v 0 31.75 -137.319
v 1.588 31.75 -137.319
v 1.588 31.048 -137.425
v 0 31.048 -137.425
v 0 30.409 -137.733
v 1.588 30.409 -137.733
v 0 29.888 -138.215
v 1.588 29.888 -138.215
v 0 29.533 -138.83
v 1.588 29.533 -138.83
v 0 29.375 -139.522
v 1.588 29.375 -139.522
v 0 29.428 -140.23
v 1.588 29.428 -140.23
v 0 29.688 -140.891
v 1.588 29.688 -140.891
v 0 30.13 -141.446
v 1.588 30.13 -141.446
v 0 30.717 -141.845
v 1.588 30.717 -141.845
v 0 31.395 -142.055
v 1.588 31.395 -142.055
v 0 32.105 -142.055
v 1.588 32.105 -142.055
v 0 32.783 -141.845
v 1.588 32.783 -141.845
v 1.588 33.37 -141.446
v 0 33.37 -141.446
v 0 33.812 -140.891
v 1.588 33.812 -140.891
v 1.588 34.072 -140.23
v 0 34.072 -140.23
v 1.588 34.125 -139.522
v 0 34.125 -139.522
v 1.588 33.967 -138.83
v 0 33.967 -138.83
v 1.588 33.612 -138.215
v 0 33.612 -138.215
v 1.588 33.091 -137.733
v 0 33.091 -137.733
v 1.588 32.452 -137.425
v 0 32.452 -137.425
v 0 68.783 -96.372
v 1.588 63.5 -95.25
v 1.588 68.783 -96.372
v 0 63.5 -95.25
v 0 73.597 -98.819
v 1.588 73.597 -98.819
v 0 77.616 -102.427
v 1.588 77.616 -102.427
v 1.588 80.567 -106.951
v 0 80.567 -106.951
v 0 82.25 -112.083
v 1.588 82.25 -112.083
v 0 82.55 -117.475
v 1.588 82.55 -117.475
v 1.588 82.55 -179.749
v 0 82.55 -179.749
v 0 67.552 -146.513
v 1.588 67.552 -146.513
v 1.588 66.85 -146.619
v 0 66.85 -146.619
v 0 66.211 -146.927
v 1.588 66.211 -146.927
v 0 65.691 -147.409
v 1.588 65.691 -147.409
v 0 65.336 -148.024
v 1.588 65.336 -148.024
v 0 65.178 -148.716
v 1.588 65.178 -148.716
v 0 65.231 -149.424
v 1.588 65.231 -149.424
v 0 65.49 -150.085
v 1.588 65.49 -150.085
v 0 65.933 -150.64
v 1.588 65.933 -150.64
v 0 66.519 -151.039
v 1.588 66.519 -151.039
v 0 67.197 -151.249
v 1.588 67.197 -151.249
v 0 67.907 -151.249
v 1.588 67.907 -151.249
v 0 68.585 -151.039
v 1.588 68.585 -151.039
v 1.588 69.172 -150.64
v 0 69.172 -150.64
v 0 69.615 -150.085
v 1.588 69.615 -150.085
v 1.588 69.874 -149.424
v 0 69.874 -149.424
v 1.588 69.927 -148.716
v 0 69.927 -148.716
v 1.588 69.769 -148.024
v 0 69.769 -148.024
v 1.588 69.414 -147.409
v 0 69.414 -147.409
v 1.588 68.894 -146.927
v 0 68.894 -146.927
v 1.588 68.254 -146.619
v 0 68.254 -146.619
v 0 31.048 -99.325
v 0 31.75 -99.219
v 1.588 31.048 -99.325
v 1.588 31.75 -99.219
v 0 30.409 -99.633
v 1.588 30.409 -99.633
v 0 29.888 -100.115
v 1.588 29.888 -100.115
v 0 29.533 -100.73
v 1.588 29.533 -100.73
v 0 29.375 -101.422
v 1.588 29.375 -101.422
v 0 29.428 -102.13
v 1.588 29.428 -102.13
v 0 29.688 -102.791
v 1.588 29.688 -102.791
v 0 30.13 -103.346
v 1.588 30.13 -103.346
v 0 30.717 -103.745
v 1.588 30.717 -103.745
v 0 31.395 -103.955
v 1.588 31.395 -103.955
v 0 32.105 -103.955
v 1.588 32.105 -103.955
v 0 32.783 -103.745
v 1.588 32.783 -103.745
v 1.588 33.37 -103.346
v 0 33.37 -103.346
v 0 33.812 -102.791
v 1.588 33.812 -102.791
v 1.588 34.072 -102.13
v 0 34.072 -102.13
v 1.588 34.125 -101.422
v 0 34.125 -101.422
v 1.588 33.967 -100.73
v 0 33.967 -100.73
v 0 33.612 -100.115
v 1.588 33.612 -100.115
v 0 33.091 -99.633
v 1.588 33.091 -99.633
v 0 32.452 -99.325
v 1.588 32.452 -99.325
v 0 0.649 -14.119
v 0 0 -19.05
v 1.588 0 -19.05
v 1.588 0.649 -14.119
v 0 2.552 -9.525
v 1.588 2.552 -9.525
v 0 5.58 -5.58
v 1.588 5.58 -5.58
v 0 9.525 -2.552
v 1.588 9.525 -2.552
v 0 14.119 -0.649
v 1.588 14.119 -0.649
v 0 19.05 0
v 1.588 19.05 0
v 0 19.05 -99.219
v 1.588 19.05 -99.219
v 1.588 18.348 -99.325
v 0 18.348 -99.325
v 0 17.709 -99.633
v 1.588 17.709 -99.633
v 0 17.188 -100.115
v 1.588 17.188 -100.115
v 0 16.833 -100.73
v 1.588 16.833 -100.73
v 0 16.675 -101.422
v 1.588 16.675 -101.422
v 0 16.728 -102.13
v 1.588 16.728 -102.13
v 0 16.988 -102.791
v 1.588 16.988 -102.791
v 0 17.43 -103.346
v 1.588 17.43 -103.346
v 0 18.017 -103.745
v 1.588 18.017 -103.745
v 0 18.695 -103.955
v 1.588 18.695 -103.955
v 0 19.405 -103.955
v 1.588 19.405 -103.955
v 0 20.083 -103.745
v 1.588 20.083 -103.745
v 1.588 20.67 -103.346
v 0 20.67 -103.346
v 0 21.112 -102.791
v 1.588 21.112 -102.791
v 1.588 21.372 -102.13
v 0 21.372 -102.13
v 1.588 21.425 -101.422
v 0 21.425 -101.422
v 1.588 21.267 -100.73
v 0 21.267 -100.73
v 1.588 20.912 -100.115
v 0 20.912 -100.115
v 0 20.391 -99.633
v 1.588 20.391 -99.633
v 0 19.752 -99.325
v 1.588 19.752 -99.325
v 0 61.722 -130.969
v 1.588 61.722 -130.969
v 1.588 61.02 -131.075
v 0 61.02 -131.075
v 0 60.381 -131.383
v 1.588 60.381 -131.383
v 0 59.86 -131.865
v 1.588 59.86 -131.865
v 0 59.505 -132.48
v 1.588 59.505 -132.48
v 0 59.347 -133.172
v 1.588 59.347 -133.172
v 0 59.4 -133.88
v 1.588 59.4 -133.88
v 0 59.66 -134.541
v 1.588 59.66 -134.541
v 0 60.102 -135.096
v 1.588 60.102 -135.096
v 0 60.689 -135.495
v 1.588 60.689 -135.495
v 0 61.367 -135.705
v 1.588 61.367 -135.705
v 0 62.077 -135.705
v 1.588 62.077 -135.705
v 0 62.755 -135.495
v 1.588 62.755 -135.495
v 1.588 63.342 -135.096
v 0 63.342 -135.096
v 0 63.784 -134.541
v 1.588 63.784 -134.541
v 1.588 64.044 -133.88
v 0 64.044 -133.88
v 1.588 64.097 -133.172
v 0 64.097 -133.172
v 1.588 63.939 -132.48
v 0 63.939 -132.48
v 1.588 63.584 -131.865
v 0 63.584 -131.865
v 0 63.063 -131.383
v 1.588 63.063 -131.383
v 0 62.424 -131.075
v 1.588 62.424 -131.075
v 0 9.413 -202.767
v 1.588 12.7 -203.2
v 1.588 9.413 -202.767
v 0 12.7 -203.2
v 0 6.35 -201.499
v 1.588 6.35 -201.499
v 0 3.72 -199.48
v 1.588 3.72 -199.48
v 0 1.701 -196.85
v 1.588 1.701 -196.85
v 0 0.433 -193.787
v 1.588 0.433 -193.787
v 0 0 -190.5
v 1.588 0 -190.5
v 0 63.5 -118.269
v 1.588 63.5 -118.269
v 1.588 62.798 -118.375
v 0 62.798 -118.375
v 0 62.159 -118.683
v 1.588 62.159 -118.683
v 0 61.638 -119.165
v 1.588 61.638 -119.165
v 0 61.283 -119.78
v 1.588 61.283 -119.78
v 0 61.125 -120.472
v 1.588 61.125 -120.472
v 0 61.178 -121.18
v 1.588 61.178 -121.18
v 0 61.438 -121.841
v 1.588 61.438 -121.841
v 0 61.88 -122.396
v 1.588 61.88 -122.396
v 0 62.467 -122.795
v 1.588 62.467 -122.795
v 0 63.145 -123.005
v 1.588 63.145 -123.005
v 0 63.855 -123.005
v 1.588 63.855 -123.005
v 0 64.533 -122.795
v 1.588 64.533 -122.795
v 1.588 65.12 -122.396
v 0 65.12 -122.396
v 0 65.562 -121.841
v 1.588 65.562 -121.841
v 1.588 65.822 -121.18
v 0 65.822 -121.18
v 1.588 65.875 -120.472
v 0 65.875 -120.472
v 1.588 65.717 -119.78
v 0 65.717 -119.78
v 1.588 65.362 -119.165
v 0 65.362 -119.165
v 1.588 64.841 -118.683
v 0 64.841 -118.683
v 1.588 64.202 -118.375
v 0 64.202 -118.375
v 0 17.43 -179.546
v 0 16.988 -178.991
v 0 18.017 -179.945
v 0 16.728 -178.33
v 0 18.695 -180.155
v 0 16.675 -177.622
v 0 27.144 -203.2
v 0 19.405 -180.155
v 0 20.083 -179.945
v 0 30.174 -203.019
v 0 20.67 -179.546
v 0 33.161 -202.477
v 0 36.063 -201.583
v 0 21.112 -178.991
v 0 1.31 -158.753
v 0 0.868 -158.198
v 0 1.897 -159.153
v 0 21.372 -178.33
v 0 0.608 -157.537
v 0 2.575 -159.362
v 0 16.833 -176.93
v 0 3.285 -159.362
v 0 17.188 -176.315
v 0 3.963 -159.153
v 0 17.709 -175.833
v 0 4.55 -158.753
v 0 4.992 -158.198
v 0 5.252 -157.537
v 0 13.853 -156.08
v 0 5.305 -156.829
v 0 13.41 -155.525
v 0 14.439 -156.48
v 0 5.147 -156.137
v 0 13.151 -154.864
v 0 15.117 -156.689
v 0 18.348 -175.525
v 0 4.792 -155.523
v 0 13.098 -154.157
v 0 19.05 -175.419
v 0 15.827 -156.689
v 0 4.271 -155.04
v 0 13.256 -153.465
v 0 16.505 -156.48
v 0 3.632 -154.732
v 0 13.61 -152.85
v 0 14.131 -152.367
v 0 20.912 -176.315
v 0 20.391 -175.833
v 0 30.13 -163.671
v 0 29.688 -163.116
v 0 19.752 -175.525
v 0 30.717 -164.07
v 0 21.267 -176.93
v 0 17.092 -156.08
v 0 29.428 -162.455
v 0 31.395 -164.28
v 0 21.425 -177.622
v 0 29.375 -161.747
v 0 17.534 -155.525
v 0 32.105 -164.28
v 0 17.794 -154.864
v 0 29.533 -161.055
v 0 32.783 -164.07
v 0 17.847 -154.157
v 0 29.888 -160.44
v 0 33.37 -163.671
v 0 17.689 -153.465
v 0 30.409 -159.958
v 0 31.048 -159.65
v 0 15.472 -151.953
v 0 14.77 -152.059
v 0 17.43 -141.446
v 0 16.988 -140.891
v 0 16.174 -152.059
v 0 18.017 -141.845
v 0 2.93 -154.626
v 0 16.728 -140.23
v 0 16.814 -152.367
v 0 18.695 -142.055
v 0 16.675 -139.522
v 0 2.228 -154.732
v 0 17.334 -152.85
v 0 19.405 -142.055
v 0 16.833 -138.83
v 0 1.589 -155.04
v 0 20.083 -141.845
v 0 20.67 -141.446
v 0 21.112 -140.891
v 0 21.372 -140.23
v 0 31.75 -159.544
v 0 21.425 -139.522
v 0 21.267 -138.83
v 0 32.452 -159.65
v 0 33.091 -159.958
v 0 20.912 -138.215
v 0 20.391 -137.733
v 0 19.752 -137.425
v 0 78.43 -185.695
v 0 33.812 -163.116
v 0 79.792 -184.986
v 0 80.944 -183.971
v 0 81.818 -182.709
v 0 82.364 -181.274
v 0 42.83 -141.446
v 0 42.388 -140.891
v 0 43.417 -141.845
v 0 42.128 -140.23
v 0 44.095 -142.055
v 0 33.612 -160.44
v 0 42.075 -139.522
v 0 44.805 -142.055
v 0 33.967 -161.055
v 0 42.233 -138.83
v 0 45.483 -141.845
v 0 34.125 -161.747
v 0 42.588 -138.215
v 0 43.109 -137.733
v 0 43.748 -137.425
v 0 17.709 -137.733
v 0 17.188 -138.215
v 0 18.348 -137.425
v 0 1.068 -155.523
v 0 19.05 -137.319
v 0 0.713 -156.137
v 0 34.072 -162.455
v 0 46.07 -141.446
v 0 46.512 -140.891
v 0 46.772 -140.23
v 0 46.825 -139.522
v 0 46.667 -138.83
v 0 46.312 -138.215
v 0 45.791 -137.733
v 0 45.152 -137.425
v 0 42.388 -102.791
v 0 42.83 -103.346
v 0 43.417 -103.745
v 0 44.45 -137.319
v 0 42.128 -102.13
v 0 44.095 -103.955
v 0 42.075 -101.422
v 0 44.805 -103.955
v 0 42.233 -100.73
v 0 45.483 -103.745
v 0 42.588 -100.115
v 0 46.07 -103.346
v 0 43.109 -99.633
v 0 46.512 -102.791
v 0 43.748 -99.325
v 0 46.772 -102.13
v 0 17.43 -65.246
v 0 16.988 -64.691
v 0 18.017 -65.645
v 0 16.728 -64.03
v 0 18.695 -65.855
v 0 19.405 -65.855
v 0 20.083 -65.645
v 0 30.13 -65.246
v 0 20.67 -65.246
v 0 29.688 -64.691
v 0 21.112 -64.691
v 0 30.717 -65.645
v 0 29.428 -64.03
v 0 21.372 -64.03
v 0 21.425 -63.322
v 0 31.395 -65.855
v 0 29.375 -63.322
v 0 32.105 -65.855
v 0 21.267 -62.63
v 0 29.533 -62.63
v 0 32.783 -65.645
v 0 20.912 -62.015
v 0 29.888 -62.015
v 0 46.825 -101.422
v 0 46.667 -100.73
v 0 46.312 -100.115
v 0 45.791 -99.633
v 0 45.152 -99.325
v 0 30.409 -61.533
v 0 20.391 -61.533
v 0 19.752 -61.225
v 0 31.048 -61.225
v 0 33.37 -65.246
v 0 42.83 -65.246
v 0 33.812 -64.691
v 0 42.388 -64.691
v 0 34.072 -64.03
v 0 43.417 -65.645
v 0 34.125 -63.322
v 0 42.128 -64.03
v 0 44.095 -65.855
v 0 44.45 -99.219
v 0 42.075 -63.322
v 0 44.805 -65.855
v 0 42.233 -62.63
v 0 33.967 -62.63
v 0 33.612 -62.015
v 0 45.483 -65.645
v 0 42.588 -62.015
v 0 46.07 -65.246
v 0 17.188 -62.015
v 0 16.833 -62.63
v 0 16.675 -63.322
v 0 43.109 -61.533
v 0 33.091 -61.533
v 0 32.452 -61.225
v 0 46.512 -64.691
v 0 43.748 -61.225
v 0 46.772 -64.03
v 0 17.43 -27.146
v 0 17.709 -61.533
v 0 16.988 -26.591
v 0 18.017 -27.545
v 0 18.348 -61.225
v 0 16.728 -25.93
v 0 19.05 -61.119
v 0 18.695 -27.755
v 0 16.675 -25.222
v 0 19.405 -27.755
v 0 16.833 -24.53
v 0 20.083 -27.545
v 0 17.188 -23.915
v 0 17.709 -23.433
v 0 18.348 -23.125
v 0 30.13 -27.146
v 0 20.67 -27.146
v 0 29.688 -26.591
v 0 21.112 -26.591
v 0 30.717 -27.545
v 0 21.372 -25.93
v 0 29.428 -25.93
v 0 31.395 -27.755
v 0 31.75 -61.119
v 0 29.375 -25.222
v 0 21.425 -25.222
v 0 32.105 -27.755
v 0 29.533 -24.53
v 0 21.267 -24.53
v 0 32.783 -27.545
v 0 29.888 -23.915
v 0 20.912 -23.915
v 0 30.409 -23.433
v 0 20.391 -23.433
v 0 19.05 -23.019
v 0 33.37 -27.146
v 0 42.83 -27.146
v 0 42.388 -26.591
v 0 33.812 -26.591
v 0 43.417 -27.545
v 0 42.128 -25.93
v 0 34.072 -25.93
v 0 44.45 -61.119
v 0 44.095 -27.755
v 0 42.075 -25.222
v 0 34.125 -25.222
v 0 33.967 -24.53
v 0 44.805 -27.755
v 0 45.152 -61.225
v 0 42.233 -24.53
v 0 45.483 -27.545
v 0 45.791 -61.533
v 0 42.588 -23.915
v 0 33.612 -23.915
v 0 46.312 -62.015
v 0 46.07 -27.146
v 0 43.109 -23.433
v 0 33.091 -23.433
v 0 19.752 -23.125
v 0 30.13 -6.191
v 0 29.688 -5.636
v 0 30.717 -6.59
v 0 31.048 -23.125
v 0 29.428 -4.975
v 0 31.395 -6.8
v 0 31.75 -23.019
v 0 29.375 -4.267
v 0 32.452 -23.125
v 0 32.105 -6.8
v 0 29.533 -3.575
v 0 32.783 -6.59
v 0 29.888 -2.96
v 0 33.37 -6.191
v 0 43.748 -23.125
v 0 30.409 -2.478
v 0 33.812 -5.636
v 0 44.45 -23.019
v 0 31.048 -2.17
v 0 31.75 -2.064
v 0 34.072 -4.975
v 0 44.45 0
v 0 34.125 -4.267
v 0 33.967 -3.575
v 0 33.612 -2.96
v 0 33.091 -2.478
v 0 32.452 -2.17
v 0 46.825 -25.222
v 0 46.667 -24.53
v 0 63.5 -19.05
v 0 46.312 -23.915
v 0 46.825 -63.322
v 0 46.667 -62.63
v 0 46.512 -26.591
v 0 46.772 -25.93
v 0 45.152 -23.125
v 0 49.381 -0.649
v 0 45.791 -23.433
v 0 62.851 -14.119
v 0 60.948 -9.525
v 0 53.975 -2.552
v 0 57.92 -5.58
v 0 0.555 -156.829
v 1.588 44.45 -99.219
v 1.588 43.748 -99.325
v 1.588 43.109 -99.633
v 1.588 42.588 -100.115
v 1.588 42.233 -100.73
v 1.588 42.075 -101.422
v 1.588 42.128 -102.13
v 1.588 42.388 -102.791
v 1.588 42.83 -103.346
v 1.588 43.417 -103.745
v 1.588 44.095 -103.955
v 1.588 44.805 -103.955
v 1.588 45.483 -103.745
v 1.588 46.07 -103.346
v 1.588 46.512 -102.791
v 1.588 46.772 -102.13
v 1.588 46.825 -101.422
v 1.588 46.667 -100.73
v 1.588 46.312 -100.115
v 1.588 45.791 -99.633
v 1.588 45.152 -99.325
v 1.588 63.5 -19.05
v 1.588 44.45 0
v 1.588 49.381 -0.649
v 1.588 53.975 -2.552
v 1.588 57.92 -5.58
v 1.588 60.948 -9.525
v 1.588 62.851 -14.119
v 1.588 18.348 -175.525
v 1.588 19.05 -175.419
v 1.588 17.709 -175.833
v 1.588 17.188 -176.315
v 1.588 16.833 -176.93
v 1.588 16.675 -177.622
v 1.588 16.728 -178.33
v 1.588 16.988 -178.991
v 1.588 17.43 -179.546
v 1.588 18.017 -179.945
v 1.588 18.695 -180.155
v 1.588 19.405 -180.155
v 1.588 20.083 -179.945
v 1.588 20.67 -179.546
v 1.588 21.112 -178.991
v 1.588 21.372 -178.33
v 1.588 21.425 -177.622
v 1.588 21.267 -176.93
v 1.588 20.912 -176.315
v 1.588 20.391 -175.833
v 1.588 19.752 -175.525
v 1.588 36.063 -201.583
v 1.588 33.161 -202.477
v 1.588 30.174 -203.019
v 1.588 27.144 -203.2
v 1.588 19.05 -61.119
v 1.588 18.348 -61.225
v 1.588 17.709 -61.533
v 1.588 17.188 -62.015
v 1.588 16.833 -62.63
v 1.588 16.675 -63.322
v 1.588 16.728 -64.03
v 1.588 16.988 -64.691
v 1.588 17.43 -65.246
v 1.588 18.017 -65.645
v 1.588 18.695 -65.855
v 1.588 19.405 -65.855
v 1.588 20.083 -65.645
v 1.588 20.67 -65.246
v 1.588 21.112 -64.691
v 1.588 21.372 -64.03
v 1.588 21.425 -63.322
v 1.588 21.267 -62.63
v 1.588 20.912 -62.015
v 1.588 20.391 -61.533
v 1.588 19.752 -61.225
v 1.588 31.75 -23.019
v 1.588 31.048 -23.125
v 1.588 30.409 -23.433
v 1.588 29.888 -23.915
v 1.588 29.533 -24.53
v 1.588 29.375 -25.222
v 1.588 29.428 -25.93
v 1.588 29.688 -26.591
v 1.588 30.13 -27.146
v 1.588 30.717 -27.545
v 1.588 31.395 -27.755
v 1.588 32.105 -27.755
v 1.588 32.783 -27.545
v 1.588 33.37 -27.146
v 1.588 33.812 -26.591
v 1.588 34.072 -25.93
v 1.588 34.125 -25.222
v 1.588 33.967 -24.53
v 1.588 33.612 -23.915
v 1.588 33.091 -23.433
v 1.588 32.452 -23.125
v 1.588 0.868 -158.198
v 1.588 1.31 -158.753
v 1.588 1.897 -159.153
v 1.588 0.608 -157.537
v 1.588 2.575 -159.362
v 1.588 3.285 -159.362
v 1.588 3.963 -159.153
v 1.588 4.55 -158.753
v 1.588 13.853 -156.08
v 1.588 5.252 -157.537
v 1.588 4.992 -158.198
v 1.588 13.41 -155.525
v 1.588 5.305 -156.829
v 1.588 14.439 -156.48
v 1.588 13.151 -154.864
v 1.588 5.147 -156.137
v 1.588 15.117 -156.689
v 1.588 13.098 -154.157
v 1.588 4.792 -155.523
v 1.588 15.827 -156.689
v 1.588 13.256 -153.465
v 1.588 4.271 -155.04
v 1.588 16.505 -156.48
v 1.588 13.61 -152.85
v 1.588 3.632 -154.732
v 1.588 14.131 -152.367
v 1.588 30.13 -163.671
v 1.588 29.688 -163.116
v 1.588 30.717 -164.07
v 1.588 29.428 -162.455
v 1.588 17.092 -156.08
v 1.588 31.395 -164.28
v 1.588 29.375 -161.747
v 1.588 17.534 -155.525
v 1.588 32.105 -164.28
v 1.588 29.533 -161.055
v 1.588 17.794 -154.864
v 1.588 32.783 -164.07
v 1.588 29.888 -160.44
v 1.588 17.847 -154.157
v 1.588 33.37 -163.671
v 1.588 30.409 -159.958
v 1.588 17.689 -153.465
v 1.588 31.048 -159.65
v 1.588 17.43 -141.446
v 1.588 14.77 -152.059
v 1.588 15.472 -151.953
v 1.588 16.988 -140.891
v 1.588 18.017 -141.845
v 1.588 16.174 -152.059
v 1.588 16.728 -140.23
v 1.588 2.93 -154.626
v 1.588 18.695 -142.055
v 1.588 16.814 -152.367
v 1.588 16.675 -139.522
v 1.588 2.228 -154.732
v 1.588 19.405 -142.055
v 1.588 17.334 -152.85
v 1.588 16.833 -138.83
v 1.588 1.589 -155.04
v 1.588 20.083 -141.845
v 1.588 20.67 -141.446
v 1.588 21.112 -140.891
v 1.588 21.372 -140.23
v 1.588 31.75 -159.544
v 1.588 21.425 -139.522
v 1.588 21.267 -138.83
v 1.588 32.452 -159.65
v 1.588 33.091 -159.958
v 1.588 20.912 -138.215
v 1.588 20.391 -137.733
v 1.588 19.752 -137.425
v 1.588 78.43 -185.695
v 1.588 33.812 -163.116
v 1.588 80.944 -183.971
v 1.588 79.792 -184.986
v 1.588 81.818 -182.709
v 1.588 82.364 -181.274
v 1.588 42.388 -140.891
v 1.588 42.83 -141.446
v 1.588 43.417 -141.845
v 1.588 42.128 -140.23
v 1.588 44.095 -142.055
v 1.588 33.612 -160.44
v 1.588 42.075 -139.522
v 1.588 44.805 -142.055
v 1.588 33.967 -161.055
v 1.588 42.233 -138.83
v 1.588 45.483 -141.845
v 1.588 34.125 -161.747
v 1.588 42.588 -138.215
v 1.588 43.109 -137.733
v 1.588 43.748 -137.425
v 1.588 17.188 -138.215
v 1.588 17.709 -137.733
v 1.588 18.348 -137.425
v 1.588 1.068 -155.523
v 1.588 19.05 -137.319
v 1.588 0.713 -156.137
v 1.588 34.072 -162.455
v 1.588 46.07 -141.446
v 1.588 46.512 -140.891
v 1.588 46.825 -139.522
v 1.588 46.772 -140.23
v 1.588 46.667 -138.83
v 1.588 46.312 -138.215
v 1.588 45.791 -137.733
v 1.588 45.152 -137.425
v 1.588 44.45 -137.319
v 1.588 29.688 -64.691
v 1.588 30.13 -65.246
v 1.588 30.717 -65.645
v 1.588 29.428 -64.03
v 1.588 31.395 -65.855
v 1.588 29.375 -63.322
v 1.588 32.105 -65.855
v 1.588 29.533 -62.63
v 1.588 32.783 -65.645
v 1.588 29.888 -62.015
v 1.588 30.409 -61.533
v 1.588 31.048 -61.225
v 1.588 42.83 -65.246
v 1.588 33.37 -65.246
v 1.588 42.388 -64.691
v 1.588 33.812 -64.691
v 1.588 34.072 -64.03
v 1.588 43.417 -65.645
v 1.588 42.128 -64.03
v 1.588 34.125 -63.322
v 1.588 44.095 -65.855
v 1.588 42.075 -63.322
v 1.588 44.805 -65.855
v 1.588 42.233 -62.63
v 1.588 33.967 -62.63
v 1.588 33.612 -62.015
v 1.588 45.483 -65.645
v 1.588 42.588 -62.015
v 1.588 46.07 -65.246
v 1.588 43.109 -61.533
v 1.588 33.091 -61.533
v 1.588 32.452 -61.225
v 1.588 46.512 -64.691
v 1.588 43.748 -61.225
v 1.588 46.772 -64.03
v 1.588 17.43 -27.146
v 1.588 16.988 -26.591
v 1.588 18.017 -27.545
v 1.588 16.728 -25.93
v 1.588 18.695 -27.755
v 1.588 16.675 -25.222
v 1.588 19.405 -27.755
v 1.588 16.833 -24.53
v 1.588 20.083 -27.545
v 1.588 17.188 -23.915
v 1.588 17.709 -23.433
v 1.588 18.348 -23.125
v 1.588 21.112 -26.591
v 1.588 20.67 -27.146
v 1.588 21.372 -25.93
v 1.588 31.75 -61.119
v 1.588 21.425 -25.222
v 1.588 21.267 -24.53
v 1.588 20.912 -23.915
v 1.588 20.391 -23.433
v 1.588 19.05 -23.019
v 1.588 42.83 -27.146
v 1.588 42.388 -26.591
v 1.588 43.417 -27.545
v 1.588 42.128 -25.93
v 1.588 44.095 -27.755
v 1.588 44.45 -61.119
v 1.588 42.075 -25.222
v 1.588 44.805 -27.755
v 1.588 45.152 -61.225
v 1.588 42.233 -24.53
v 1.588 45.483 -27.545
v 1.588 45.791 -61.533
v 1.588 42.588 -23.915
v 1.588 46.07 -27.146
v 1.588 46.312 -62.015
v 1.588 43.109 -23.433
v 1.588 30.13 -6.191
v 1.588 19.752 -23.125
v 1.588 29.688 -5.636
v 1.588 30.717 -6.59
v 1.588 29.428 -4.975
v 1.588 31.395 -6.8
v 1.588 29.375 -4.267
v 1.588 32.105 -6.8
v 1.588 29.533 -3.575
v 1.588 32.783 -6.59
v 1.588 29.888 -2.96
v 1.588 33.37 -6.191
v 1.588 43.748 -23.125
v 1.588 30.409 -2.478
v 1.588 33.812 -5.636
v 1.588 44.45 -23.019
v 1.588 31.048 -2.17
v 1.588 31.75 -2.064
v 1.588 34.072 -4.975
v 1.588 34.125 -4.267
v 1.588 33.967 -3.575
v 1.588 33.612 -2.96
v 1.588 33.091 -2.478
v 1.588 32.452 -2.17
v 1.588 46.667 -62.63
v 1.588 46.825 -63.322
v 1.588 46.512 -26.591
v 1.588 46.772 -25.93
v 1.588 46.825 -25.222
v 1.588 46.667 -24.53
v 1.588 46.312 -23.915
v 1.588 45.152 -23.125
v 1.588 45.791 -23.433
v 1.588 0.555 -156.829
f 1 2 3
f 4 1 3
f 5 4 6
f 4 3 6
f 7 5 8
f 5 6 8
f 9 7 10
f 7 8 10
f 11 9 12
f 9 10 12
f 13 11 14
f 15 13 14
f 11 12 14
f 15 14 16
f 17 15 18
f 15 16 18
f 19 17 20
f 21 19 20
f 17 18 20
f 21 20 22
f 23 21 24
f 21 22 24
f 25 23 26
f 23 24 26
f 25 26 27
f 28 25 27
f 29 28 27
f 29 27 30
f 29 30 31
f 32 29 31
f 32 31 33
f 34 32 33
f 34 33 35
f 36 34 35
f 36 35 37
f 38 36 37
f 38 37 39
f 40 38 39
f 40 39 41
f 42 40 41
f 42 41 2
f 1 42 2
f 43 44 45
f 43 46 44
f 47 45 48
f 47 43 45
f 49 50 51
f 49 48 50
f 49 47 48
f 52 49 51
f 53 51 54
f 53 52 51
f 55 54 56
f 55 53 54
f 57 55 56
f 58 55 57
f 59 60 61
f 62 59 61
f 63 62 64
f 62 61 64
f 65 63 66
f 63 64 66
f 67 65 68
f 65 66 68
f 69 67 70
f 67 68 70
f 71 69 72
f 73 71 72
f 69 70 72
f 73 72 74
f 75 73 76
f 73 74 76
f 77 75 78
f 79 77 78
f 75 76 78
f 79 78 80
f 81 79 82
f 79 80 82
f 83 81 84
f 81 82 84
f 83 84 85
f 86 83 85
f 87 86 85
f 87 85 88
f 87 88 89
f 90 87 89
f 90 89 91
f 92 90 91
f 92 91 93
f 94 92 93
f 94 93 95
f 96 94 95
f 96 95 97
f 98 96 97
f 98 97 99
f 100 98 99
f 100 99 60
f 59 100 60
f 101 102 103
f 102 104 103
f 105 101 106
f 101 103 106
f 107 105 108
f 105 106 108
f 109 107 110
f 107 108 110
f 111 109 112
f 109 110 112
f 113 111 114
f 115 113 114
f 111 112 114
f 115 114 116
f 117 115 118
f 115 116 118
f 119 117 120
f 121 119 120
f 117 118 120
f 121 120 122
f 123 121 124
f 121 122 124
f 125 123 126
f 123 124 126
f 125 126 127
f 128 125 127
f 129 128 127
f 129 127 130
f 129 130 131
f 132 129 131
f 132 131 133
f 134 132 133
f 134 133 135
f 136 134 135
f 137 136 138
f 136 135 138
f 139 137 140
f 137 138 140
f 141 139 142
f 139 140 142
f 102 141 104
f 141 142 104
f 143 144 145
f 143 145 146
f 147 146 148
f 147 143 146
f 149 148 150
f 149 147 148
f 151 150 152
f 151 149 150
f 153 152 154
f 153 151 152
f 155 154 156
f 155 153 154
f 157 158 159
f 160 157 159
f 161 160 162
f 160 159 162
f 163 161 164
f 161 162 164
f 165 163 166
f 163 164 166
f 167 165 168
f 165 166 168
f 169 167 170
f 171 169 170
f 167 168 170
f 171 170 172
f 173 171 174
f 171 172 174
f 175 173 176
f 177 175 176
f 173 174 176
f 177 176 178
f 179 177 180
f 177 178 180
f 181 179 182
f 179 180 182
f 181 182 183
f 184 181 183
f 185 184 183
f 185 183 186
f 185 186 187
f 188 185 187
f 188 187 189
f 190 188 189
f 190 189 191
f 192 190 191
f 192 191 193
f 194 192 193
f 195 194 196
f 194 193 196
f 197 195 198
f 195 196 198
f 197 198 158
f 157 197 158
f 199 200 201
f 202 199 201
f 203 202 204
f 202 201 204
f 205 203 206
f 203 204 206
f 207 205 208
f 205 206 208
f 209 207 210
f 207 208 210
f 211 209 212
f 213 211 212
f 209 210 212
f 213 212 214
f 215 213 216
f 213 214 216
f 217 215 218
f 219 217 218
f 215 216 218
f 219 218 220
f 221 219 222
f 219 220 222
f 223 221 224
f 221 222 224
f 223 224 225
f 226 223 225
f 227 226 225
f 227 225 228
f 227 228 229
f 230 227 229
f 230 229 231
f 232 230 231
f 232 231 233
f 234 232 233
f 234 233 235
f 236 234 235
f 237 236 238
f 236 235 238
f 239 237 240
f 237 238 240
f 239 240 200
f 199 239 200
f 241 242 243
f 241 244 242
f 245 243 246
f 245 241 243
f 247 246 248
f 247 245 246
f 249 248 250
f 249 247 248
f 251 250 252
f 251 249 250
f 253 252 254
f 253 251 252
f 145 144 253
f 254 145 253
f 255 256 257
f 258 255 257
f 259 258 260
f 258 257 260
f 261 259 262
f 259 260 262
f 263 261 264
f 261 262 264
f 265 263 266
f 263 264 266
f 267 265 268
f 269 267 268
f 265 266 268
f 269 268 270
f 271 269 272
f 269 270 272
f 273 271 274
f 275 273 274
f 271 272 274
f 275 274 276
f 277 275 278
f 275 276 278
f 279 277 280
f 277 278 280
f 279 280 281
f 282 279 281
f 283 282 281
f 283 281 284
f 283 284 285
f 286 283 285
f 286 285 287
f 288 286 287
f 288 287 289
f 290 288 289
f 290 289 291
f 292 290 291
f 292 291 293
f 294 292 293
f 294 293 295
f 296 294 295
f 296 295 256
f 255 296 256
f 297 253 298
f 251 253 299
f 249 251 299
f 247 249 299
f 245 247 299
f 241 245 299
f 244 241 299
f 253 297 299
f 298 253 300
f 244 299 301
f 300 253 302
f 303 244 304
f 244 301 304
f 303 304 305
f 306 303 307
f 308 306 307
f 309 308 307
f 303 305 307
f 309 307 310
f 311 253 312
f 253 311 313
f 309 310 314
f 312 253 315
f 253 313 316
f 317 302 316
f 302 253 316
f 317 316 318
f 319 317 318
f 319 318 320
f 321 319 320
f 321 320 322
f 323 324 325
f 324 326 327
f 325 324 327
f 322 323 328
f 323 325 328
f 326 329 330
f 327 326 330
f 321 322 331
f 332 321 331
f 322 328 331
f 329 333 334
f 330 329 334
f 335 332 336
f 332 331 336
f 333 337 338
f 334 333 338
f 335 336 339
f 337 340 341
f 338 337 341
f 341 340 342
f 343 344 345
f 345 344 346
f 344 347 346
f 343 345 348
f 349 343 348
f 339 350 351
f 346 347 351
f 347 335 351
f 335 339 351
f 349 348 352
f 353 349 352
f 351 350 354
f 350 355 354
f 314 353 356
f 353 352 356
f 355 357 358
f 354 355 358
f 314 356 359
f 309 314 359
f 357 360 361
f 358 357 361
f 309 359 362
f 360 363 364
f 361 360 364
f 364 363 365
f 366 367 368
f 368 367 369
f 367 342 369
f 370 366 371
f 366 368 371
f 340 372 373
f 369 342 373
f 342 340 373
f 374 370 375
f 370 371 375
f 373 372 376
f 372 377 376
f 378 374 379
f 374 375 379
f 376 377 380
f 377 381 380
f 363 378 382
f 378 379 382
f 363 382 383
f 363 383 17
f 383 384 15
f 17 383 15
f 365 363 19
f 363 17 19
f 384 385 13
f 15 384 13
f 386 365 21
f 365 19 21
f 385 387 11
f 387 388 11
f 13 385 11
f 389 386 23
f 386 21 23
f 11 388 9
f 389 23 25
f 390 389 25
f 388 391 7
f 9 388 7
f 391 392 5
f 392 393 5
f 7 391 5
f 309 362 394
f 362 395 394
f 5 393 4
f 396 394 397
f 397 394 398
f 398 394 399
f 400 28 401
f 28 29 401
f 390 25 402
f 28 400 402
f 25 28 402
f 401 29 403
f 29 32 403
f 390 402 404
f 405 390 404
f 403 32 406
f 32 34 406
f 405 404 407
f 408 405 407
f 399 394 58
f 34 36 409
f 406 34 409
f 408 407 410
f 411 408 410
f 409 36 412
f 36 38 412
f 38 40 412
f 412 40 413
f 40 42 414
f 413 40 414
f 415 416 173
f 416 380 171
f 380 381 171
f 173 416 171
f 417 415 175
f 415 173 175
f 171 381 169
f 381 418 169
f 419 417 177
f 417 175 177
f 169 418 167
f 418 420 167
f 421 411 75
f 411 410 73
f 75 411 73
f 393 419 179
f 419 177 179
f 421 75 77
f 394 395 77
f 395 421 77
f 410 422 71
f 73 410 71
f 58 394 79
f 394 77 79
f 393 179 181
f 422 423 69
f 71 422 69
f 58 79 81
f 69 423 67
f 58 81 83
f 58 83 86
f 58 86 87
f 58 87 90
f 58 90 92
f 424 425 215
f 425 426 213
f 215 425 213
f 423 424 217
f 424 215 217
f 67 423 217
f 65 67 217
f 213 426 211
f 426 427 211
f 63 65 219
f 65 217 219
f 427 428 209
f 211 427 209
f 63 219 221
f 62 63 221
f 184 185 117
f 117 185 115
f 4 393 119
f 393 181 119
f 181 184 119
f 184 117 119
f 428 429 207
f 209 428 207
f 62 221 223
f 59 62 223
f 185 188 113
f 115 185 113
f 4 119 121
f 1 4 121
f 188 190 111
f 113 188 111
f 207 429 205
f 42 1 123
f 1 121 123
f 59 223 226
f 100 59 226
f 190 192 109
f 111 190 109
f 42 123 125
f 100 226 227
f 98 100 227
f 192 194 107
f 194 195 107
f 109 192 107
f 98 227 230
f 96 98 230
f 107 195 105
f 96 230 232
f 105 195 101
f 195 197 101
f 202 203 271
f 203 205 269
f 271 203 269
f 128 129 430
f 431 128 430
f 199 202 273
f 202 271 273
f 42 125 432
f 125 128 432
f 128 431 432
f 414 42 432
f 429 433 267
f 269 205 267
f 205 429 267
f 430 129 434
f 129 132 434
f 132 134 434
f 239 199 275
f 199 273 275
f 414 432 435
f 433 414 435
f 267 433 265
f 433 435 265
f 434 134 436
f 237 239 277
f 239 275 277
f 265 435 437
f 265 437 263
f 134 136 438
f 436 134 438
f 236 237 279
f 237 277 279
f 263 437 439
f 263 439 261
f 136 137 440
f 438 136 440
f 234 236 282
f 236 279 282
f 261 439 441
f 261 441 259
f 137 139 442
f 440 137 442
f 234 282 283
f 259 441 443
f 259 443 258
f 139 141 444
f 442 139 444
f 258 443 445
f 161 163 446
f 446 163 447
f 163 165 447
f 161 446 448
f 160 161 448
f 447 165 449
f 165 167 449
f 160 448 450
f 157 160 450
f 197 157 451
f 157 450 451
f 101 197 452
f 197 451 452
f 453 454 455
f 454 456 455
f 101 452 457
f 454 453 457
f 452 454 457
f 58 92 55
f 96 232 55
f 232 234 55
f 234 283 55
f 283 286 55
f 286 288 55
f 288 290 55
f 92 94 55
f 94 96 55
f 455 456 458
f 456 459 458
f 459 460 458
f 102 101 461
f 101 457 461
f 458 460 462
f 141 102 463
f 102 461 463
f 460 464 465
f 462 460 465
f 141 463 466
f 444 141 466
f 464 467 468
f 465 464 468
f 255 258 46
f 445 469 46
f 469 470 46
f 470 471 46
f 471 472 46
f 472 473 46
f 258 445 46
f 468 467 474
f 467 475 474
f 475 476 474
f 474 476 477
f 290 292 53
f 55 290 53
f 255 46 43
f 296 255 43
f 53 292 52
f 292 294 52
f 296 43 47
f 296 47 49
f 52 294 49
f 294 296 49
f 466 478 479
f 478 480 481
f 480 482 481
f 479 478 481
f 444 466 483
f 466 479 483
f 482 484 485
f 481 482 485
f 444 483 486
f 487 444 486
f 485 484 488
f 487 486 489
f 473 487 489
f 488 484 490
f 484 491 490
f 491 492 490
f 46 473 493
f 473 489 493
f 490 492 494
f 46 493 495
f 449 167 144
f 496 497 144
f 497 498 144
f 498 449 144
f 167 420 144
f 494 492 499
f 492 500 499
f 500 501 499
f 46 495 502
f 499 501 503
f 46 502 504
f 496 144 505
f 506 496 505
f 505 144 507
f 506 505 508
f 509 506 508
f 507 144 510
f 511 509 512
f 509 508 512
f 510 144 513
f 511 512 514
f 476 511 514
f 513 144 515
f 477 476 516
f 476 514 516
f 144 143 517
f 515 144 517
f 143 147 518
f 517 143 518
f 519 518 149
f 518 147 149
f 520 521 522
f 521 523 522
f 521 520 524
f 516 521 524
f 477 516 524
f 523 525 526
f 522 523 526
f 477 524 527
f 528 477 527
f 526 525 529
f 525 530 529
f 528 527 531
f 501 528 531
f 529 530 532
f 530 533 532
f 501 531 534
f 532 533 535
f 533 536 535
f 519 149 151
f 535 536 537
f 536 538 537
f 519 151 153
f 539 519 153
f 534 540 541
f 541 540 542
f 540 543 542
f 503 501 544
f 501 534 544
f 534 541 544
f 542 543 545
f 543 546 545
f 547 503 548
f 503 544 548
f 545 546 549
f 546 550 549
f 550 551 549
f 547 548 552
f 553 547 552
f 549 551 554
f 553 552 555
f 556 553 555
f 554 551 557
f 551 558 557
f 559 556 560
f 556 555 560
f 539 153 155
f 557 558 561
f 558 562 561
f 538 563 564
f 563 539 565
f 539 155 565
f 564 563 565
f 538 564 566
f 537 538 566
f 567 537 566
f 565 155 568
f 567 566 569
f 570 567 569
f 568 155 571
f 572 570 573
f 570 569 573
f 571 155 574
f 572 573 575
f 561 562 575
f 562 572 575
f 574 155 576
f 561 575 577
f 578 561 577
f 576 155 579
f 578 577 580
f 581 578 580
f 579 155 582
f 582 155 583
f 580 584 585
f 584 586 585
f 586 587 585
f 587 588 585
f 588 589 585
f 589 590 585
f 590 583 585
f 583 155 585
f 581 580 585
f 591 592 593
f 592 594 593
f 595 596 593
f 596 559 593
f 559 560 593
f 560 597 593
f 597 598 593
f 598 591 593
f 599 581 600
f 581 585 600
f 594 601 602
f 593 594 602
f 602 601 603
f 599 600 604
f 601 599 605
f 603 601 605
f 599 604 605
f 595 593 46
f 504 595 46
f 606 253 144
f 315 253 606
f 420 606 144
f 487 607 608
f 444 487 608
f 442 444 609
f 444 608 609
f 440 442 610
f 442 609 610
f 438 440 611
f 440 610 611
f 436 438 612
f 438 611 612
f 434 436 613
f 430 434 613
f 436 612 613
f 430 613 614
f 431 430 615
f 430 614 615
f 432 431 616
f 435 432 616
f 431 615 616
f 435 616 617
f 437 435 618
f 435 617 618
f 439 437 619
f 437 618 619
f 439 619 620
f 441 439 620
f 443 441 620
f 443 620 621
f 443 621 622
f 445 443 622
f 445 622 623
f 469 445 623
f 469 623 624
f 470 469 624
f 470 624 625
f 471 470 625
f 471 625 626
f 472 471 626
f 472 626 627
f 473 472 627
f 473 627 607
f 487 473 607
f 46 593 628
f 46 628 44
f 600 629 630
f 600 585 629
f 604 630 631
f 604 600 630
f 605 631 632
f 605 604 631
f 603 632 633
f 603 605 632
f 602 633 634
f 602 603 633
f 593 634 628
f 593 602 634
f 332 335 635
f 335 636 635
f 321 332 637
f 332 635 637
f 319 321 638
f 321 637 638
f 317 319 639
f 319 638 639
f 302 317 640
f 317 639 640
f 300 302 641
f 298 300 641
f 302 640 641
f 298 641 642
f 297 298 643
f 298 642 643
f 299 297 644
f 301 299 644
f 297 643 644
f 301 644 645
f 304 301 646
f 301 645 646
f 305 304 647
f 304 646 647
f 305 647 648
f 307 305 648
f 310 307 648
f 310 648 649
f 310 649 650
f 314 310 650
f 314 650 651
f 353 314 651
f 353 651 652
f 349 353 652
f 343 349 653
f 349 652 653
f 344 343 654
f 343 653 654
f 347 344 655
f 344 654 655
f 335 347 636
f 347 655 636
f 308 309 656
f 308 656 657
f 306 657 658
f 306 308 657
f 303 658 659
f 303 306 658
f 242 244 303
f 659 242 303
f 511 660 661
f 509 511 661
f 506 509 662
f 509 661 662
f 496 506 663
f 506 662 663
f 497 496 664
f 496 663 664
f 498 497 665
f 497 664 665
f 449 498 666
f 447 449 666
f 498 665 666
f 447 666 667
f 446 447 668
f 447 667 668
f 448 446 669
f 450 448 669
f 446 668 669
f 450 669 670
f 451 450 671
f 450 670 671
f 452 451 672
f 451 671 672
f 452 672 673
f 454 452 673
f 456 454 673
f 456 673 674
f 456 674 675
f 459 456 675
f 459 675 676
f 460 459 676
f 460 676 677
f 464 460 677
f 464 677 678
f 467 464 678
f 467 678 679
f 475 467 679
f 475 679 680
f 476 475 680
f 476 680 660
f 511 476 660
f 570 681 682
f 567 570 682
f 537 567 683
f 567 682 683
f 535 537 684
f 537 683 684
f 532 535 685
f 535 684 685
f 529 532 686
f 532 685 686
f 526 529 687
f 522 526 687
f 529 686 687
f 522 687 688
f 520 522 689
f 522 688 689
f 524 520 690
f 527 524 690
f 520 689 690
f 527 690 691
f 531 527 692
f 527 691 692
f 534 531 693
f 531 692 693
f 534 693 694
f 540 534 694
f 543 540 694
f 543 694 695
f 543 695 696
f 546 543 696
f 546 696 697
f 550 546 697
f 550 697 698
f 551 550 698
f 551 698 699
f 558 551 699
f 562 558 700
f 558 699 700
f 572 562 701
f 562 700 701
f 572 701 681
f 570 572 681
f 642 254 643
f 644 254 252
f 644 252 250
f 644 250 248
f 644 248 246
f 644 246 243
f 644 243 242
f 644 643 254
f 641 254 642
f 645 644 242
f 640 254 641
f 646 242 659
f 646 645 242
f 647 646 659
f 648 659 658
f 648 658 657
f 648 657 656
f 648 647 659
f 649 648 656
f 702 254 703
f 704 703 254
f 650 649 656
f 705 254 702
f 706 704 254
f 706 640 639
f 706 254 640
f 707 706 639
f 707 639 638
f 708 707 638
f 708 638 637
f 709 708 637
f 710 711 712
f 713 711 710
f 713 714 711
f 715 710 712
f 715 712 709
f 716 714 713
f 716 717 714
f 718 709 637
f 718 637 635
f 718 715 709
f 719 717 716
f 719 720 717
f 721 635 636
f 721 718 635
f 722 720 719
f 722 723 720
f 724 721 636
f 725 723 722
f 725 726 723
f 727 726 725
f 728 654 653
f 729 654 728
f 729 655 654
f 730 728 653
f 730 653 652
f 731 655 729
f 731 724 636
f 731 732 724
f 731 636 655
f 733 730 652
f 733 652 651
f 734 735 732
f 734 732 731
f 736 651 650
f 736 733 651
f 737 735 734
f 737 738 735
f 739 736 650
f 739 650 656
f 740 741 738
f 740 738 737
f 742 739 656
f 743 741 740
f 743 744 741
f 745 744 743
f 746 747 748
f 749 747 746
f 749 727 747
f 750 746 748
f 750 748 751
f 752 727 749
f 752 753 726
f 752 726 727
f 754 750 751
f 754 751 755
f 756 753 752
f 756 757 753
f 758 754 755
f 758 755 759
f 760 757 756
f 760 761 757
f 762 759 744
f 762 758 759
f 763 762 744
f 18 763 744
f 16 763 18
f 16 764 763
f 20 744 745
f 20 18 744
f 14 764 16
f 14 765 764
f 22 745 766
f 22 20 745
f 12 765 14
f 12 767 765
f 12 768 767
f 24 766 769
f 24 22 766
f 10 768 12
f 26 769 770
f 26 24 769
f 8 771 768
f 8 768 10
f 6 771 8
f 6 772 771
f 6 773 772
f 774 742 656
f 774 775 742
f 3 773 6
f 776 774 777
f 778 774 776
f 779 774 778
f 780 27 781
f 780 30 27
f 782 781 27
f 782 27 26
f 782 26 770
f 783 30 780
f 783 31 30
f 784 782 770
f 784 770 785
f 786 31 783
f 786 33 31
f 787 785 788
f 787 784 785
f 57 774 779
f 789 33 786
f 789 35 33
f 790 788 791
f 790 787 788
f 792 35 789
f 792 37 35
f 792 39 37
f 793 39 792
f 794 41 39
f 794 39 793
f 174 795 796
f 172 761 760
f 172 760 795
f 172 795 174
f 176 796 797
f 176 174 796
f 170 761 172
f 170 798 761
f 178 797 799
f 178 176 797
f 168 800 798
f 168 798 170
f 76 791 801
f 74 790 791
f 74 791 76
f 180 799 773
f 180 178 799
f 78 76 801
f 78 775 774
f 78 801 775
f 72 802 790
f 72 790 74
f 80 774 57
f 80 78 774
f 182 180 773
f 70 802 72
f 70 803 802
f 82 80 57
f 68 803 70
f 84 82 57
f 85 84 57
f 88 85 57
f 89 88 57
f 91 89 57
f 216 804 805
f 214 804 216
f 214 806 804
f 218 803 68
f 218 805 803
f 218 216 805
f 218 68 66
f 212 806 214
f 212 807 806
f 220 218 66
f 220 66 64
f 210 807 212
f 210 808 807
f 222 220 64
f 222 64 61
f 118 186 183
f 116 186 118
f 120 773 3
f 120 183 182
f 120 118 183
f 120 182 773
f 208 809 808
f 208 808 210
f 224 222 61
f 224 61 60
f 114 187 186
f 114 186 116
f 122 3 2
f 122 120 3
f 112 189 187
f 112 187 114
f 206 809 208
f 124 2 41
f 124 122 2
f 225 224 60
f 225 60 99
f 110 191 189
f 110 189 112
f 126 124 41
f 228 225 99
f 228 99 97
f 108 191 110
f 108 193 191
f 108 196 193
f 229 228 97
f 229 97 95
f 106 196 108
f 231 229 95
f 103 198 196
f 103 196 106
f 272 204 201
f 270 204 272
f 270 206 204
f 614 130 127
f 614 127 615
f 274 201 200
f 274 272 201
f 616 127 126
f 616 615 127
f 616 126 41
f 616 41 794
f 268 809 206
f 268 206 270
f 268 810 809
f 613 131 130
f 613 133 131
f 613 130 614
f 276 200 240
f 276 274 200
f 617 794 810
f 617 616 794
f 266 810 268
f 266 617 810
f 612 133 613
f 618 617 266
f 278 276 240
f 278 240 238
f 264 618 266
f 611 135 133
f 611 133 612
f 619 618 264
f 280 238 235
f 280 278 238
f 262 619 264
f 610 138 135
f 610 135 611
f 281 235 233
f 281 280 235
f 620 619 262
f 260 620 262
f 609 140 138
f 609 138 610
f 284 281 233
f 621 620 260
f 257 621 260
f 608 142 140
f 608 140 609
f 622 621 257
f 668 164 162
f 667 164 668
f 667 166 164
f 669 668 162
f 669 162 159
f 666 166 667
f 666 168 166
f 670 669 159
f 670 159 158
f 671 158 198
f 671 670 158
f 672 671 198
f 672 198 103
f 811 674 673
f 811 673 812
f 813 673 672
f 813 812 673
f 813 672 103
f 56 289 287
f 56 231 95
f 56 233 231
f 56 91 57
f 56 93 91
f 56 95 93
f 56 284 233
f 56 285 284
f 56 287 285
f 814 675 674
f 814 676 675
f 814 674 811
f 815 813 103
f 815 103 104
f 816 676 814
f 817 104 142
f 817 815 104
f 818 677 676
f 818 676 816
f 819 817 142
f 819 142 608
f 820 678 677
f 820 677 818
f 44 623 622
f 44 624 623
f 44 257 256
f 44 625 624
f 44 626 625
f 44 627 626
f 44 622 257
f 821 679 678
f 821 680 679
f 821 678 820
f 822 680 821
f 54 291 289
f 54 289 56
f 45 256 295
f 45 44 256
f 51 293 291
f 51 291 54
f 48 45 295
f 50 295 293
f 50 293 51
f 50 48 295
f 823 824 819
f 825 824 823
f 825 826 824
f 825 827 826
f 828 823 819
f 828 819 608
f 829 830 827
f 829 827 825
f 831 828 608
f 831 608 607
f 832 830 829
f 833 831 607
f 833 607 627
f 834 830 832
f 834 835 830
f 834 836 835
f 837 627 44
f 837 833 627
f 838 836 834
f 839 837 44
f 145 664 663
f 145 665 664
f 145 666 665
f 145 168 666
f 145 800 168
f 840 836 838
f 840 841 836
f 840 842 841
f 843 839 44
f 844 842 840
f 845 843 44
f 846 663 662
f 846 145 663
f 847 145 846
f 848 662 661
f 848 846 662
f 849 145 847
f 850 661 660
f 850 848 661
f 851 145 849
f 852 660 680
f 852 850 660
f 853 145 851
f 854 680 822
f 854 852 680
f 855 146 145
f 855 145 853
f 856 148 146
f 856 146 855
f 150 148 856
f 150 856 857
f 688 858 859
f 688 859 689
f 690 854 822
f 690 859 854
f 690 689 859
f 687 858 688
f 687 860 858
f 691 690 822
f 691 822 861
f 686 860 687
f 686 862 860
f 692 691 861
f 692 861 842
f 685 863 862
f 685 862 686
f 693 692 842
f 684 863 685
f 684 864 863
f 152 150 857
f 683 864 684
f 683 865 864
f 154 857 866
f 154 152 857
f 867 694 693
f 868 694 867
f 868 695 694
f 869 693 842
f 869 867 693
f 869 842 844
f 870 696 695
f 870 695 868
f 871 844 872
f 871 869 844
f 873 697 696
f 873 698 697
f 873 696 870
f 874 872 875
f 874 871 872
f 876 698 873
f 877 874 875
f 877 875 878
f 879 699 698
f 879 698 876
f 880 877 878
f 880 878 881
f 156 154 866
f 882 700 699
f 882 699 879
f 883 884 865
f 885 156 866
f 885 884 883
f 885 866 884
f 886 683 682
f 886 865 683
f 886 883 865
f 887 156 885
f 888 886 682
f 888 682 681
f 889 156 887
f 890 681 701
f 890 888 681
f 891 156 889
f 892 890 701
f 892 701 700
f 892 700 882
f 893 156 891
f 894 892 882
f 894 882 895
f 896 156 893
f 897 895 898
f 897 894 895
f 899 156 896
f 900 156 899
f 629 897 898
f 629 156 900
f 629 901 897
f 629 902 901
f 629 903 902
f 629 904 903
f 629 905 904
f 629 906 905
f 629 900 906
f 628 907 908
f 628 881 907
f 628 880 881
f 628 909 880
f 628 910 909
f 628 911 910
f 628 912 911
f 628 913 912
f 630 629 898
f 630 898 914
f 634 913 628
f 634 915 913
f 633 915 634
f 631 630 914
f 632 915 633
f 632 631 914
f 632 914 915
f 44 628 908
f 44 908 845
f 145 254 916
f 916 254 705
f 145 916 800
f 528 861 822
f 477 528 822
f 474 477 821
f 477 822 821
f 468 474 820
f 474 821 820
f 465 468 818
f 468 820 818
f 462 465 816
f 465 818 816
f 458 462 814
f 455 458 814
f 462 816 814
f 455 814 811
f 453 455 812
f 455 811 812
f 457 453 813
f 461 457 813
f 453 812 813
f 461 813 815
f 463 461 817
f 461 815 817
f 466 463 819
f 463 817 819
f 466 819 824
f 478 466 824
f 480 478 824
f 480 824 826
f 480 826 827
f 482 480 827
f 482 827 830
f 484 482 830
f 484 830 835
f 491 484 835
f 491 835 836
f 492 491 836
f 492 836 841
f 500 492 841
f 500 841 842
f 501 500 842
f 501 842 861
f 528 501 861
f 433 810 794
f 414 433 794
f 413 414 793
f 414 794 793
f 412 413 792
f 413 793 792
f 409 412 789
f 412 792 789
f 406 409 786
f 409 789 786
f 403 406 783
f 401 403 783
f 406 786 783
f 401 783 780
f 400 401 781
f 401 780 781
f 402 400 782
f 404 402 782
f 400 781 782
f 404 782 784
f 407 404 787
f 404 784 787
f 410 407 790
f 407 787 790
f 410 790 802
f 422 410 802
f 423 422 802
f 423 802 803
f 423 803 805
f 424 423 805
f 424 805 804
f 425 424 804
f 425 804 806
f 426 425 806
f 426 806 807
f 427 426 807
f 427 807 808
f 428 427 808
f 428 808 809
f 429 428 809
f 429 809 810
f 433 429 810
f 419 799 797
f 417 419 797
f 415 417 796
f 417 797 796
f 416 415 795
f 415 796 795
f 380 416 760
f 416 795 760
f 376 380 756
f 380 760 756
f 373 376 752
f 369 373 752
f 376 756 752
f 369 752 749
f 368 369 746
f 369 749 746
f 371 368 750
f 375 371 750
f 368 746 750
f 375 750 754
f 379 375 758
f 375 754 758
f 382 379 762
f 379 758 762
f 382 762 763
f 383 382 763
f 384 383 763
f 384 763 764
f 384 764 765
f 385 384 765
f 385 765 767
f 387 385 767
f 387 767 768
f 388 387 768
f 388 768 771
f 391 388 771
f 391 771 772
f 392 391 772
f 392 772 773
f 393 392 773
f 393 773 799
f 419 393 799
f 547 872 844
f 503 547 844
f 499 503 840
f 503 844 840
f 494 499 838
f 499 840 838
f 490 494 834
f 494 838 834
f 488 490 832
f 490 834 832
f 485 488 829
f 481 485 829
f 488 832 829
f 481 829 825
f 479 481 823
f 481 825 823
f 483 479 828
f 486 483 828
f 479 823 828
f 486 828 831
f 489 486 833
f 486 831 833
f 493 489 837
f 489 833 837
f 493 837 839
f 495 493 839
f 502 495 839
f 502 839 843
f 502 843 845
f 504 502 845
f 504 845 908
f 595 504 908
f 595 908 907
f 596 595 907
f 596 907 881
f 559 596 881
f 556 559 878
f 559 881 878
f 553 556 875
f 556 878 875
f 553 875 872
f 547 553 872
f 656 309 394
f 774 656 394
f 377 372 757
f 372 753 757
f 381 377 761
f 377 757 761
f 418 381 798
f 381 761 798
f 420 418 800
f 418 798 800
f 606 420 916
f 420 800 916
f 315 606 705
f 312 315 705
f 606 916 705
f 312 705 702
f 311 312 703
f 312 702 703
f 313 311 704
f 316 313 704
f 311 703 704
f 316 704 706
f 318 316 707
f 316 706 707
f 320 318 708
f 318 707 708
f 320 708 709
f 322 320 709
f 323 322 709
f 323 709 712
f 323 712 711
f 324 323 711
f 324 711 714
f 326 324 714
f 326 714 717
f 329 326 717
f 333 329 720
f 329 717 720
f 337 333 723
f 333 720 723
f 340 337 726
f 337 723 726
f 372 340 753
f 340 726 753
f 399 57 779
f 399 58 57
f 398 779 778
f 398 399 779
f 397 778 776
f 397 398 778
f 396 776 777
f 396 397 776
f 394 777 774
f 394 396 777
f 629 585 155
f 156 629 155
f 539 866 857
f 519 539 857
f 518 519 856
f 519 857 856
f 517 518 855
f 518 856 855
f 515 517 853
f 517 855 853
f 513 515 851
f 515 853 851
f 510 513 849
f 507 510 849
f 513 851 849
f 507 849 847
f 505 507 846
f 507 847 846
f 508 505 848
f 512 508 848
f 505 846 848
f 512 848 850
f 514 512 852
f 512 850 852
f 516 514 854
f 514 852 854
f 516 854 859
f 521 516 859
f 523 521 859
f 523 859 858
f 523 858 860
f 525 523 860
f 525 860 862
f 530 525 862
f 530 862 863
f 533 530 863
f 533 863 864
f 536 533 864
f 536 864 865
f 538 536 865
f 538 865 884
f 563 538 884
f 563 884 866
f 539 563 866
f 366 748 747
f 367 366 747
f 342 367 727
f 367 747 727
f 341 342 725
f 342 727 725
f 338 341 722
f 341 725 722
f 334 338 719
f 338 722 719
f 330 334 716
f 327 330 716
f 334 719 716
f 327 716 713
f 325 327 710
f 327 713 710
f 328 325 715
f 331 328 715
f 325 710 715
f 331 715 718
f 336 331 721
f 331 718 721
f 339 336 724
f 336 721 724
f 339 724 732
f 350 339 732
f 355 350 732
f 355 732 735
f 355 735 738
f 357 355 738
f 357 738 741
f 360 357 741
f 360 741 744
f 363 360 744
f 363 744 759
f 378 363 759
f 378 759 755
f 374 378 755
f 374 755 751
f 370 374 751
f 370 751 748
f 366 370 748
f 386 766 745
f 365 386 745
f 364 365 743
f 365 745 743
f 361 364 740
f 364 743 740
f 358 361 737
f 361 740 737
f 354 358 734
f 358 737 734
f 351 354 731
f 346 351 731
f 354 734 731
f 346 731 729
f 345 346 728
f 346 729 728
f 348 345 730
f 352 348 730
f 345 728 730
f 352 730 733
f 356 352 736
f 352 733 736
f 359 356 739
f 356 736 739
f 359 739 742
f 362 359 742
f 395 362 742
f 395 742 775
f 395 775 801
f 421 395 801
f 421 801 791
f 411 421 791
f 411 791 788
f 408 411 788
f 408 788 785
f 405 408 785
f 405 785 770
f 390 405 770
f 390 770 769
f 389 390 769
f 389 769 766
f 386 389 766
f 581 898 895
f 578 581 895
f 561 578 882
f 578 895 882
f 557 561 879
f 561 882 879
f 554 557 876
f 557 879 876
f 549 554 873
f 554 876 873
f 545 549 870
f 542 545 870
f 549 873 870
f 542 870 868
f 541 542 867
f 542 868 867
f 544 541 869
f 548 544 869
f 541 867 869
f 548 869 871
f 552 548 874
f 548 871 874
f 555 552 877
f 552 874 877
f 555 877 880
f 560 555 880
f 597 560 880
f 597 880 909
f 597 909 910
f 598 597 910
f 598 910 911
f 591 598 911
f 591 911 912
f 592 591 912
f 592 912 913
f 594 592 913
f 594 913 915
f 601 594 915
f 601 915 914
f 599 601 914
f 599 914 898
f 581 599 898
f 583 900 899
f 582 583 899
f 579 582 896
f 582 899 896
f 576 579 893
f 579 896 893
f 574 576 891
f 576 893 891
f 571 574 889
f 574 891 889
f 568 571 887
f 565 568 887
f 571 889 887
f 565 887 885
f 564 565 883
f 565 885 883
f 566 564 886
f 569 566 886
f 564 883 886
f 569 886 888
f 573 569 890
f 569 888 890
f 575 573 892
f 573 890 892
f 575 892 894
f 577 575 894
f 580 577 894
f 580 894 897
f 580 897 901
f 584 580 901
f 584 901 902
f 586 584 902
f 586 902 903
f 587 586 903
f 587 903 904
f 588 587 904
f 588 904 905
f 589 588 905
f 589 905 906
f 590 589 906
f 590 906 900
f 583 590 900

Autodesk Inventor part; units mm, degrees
ref_plane "YZ Plane" through (0, 0, 0) normal (1, 0, 0) x (0, 1, 0)
ref_plane "XZ Plane" through (0, 0, 0) normal (0, 1, 0) x (-1, 0, 0)
ref_plane "XY Plane" through (0, 0, 0) normal (0, 0, 1) x (1, 0, 0)
sketch "Sketch1" plane through (0, 0, 0) normal (1, 0, 0) x (0, 1, 0)
  line L0 (0, -19.05) -> (0, -190.5)
  line L1 (12.7, -203.2) -> (27.1441, -203.2)
  line L2 (63.5, -203.2) -> (63.5, -19.05) construction
  line L3 (0, -25.4) -> (19.05, -25.4) construction
  line L4 (19.05, -25.4) -> (19.05, -63.5) construction
  line L5 (19.05, -63.5) -> (19.05, -101.6) construction
  line L6 (19.05, -101.6) -> (19.05, -139.7) construction
  line L7 (19.05, -25.4) -> (31.75, -25.4) construction
  line L8 (31.75, -25.4) -> (44.45, -25.4) construction
  line L9 (44.45, -25.4) -> (44.45, -63.5) construction
  line L10 (44.45, -63.5) -> (44.45, -101.6) construction
  line L11 (44.45, -101.6) -> (44.45, -139.7) construction
  line L12 (31.75, -25.4) -> (31.75, -63.5) construction
  line L13 (31.75, -63.5) -> (31.75, -101.6) construction
  line L14 (31.75, -101.6) -> (31.75, -139.7) construction
  line L15 (31.75, -139.7) -> (31.75, -161.925) construction
  line L16 (44.45, 0) -> (19.05, 0)
  arc A0 (19.05, 0) -> (0, -19.05) centre (19.05, -19.05) ccw
  arc A1 (63.5, -19.05) -> (44.45, 0) centre (44.45, -19.05) ccw
  line L17 (31.75, -161.925) -> (67.5523, -148.894) construction
  line L18 (31.75, -161.925) -> (69.85, -161.925) construction
  line L19 (19.05, -139.7) -> (19.05, -177.8) construction
  line L20 (31.75, -161.925) -> (19.8159, -166.2687) construction
  line L21 (31.75, -161.925) -> (44.45, -161.925) construction
  line L22 (19.8159, -166.2687) -> (15.4722, -154.3346) construction
  line L23 (15.4722, -154.3346) -> (3.5382, -158.6782) construction
  line L24 (3.5382, -158.6782) -> (2.93, -157.0074)
  line L25 (44.45, -101.6) -> (44.45, -120.65)
  line L26 (44.45, -120.65) -> (63.5, -120.65)
  line L27 (63.5, -120.65) -> (63.5, -133.35)
  line L28 (63.5, -133.35) -> (61.722, -133.35)
  line L29 (63.5, -19.05) -> (63.5, -95.25)
  line L30 (63.5, -203.2) -> (82.55, -203.2)
  line L31 (82.55, -203.2) -> (82.55, -184.15)
  line L32 (63.5, -95.25) -> (63.5, -117.475)
  line L33 (63.5, -117.475) -> (82.55, -117.475) construction
  arc A2 (82.55, -117.475) -> (63.5, -95.25) centre (61.8713, -115.9228) ccw
  line L34 (82.55, -117.475) -> (82.55, -179.7494)
  line L35 (82.55, -203.2) -> (31.75, -203.2)
  line L36 (36.0626, -201.5828) -> (78.4296, -185.6951)
  arc A3 (0, -190.5) -> (12.7, -203.2) centre (12.7, -190.5) ccw
  arc A4 (78.4296, -185.6951) -> (82.55, -179.7494) centre (76.2, -179.7494) ccw
  arc A5 (27.1441, -203.2) -> (36.0626, -201.5828) centre (27.1441, -177.8) ccw
  line L37 (31.75, -25.4) -> (31.75, -4.445) construction
  point P0 (0, 0)
  point P1 (0, -203.2)
  point P2 (63.5, 0)
  point P3 (63.5, -134.85)
  point P4 (63.5, -181.028)
  point P5 (63.5, -191.2938)
  dimension "d0" = 203.2
  dimension "d1" = 63.5
  dimension "d13" = 38.1
  dimension "d14" = 38.1
  dimension "d15" = 38.1
  dimension "d17" = 12.7
  dimension "d18" = 12.7
  dimension "d19" = 22.225
  dimension "d28" = 19.05
  dimension "d29" = 19.05
  dimension "d31" = 38.1
  dimension "d32" = 20
  dimension "d33" = 38.1
  dimension "d34" = 38.1
  dimension "d35" = 38.1
  dimension "d36" = 38.1
  dimension "d40" = 12.7
  dimension "d41" = 160
  dimension "d42" = 12.7
  dimension "d43" = 12.7
  dimension "d44" = 1.778
  dimension "d45" = 19.05
  dimension "d46" = 19.05
  dimension "d48" = 12.7
  dimension "d49" = 1.778
  dimension "d50" = 76.2
  dimension "d51" = 19.05
  dimension "d52" = 19.05
  dimension "d53" = 22.225
  dimension "d54" = 50.8
  dimension "d55" = 12.7
  dimension "d56" = 6.35
  dimension "d57" = 25.4
  dimension "d58" = 20.955
extrude "Extrusion1" add sketch "Sketch1" along normal blind 1.5875
hole "Hole2" at (0, 19.05, -25.4) at (0, 19.05, -63.5) at (0, 19.05, -101.6) at (0, 19.05, -139.7) at (0, 44.45, -25.4) at (0, 31.75, -25.4) at (0, 31.75, -63.5) at (0, 44.45, -63.5) at (0, 31.75, -101.6) at (0, 44.45, -101.6) at (0, 31.75, -139.7) at (0, 44.45, -139.7) at (0, 31.75, -161.925) at (0, 67.5523, -148.894) at (0, 19.05, -177.8) at (0, 15.4722, -154.3346) at (0, 2.93, -157.0074) at (0, 63.5, -120.65) at (0, 61.722, -133.35) at (0, 31.75, -4.445) direction (1, 0, 0) diameter 4.7625 end through all
properties part number "dtplate"
